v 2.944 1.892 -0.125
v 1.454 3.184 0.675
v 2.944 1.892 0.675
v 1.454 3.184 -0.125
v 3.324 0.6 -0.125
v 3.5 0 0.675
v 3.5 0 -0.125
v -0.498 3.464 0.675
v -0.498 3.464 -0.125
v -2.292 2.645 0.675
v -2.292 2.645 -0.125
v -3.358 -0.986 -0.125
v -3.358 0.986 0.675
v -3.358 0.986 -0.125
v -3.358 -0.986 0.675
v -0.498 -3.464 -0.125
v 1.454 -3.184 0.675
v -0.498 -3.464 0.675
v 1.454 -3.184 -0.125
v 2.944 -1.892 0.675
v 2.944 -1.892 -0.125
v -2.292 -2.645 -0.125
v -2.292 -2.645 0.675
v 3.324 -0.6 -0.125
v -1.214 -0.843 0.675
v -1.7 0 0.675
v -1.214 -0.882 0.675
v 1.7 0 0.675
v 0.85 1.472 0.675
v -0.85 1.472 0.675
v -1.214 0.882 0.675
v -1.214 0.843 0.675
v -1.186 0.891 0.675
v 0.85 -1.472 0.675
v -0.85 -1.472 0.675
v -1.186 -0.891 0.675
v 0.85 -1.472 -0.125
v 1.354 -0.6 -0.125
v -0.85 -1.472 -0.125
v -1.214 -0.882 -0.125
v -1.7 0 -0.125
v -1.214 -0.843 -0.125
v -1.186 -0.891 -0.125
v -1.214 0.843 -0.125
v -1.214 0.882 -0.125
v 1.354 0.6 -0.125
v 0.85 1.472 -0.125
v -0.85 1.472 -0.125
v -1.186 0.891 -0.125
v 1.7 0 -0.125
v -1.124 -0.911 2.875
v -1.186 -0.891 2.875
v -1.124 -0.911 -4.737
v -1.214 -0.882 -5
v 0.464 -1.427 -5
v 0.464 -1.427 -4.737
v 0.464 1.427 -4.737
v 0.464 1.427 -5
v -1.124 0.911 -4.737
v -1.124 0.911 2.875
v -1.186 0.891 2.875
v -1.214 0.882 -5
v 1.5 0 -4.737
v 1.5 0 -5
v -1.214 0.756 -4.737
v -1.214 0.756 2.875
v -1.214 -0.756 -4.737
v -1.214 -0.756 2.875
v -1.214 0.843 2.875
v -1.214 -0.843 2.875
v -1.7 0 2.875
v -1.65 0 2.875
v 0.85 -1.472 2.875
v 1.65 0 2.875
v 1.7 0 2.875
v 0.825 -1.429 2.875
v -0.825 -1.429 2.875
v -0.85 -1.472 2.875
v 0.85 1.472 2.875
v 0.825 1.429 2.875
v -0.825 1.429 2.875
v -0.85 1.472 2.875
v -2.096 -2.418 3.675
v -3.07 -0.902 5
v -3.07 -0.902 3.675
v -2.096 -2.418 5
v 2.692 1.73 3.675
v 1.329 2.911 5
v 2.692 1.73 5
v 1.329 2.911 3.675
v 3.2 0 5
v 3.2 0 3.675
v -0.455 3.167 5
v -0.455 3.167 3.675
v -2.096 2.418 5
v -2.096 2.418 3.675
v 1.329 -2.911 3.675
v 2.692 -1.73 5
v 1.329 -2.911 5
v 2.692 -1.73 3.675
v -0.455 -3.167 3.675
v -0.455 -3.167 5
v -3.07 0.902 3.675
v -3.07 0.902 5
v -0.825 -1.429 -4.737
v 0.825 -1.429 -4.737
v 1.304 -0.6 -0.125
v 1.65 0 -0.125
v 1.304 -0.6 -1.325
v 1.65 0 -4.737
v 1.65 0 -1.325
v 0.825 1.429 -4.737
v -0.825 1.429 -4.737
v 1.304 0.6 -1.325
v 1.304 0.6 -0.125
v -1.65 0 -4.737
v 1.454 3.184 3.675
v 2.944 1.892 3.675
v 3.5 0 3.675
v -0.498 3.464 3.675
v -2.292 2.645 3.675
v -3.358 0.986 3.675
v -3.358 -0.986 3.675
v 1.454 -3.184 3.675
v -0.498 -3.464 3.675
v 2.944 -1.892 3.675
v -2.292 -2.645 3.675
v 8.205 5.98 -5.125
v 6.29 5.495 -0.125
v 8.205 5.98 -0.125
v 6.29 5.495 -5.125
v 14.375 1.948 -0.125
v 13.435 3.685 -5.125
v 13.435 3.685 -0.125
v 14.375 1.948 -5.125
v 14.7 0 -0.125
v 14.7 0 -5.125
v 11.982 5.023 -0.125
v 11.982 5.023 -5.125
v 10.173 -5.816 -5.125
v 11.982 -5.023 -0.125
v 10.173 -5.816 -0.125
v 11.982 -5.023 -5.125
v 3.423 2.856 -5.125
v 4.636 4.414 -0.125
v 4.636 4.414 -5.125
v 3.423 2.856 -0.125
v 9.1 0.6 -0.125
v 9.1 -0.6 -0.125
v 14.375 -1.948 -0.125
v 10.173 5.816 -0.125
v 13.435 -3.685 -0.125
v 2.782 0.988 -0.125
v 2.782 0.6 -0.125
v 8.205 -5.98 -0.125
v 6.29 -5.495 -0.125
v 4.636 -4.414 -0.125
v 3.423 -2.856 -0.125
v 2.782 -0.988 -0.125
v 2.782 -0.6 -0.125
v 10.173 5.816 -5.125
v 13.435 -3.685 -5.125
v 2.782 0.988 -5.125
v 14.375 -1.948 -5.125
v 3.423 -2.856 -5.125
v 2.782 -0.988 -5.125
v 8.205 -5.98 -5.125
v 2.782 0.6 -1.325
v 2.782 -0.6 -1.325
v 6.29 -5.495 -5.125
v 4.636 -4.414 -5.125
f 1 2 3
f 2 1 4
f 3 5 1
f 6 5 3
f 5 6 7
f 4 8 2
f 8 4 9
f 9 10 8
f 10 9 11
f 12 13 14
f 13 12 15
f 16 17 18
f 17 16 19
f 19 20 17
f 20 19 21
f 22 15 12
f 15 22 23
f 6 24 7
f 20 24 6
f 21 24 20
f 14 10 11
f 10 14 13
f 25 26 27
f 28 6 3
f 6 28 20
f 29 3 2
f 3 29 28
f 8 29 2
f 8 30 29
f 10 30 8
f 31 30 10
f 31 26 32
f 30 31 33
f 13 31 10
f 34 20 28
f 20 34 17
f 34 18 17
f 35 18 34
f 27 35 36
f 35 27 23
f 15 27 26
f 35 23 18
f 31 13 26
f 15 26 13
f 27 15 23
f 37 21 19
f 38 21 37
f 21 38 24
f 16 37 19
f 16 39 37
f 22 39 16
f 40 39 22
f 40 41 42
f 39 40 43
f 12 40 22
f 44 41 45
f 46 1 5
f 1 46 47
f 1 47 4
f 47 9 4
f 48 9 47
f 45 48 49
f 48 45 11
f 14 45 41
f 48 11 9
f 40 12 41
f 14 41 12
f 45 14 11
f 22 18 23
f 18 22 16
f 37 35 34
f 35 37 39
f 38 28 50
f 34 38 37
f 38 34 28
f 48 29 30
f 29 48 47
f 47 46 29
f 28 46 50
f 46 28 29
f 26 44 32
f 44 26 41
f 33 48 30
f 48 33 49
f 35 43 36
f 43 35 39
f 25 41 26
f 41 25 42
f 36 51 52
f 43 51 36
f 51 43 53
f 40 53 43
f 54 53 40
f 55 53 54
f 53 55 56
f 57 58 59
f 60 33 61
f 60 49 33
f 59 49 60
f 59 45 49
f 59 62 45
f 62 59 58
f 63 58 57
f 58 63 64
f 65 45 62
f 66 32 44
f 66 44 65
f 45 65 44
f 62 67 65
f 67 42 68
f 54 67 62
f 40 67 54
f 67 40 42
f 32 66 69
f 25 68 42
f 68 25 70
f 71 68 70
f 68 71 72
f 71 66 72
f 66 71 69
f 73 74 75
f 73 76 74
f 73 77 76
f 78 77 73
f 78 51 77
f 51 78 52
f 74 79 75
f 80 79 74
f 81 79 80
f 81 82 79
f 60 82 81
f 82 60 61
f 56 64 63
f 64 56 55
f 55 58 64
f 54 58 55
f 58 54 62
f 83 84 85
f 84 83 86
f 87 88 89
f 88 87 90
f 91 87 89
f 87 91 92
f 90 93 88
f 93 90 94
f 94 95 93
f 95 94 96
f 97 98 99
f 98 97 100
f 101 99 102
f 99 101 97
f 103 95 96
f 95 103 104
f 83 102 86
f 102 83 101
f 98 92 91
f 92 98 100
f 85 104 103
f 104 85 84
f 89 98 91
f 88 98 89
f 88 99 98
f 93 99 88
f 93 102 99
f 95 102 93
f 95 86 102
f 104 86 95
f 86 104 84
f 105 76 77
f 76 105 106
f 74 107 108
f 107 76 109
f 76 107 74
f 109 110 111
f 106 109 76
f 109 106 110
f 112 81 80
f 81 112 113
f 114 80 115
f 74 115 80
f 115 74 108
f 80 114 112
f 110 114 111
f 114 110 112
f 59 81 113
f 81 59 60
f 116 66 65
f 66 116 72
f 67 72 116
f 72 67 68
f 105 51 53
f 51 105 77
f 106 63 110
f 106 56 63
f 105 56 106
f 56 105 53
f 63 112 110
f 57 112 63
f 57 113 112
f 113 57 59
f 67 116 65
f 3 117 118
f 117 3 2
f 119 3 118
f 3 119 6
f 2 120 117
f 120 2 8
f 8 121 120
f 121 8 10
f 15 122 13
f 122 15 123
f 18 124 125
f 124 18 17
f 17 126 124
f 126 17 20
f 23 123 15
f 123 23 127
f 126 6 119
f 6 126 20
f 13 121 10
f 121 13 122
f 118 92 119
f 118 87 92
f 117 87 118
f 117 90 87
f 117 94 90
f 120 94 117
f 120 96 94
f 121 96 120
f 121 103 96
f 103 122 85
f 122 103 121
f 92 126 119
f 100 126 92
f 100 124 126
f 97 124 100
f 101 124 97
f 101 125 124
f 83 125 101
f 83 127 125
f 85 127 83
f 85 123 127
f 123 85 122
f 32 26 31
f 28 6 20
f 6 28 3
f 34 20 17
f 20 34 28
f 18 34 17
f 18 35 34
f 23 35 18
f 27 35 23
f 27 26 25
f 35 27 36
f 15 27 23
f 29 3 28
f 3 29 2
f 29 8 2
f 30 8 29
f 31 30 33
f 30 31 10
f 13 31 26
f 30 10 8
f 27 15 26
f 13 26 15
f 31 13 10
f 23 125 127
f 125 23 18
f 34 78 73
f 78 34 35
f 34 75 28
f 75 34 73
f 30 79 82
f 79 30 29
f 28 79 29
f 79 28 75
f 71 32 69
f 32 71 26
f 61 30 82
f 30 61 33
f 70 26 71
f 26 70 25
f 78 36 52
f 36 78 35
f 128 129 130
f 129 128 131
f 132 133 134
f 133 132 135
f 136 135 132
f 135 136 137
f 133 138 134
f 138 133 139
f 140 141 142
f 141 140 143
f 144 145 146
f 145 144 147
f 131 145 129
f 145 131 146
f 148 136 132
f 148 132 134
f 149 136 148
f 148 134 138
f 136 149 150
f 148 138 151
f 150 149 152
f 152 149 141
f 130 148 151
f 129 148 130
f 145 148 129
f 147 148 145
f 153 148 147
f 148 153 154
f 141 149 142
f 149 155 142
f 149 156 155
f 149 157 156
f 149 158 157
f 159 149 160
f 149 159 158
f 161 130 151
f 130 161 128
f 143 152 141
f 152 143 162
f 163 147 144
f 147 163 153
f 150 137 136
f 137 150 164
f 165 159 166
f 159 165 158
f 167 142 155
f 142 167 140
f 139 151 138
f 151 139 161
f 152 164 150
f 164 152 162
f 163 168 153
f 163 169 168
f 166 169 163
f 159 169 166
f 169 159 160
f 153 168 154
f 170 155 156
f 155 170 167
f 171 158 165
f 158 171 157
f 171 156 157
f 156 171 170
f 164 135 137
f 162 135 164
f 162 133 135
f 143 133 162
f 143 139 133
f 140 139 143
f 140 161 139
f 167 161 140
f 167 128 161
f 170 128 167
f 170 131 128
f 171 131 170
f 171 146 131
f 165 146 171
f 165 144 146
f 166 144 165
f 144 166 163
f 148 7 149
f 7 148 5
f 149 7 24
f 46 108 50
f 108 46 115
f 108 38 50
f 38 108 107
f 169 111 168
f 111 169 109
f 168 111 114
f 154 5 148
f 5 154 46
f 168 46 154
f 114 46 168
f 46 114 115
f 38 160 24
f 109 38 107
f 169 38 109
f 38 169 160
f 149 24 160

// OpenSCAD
// Parameters
shaft_diameter_mm = 3; //[1.5:6:0.1]
length_mm = 10; //[5:20:0.5]
head_diameter_mm = 6.4; //[3.2:12.8:0.1]
head_height_mm = 2.125; //[1.0625:4.25:0.025]
threaded = 1; //[0:1:1]
thread_pitch_mm = 0.5; //[0.25:1:0.05]
thread_depth_mm = 0.15; //[0.05:0.35:0.01]
thread_length_mm = 8; //[3:18:0.5]
under_head_fillet_height_mm = 0.6; //[0.3:1.2:0.05]
overlap_mm = 0.8; //[0.2:2:0.1]
pcb_spacer_height_mm = 3; //[1.5:8:0.5]
pcb_spacer_wall_mm = 1.8; //[0.9:3.6:0.1]
clearance_mm = 0.2; //[0.1:0.6:0.05]
washer_outer_diameter_mm = 7; //[3.5:14:0.1]
washer_thickness_mm = 0.8; //[0.4:1.6:0.05]
buzzer_diameter_mm = 12; //[6:24:0.5]
buzzer_height_mm = 5; //[2.5:10:0.5]
buzzer_bridge_thickness_mm = 1.2; //[0.6:2.4:0.1]

// PCB Spacer - complete geometry
module pcb_spacer() {
  color([0.85, 0.85, 0.8]) {
    difference() {
      cylinder(r=shaft_diameter_mm/2 + clearance_mm + pcb_spacer_wall_mm, h=pcb_spacer_height_mm, center=true);
      translate([0, 0, -overlap_mm])
        cylinder(r=shaft_diameter_mm/2 + clearance_mm, h=pcb_spacer_height_mm + 2*overlap_mm, center=true);
    }
  }
}

// Screw and Washer - complete geometry
module screw_and_washer() {
  color("DimGray") {
    union() {
      // Screw Shaft
      translate([0, 0, -head_height_mm/2])
        cylinder(r=shaft_diameter_mm/2, h=length_mm - head_height_mm, center=true);
      
      // Hex Head
      translate([0, 0, length_mm/2 - head_height_mm/2])
        cylinder(r=head_diameter_mm/2, h=head_height_mm, center=true);
      
      // Under Head Transition
      translate([0, 0, length_mm/2 - head_height_mm - under_head_fillet_height_mm/2 + overlap_mm])
        cylinder(r1=head_diameter_mm/2, r2=shaft_diameter_mm/2, h=under_head_fillet_height_mm, center=true);
      
      // Thread Representation
      if (threaded) {
        translate([0, 0, -(length_mm - head_height_mm)/2 + thread_length_mm/2 - overlap_mm])
          cylinder(r=shaft_diameter_mm/2 + thread_depth_mm, h=thread_length_mm, center=true);
      }
      
      // Washer
      translate([0, 0, length_mm/2 - head_height_mm - pcb_spacer_height_mm - washer_thickness_mm/2 + overlap_mm])
        difference() {
          cylinder(r=washer_outer_diameter_mm/2, h=washer_thickness_mm, center=true);
          translate([0, 0, -overlap_mm])
            cylinder(r=shaft_diameter_mm/2 + clearance_mm, h=washer_thickness_mm + 2*overlap_mm, center=true);
        }
    }
  }
}

// Buzzer - complete geometry
module buzzer() {
  color([0.1, 0.1, 0.6]) {
    union() {
      // Buzzer Body
      translate([washer_outer_diameter_mm/2 + buzzer_diameter_mm/2 - overlap_mm, 0, length_mm/2 - head_height_mm - pcb_spacer_height_mm - washer_thickness_mm - buzzer_height_mm/2 + overlap_mm])
        cylinder(r=buzzer_diameter_mm/2, h=buzzer_height_mm, center=true);
      
      // Buzzer Bridge
      translate([(washer_outer_diameter_mm/2 + buzzer_diameter_mm/2 - overlap_mm)/2, 0, length_mm/2 - head_height_mm - pcb_spacer_height_mm - washer_thickness_mm - buzzer_bridge_thickness_mm/2 + overlap_mm])
        cube([washer_outer_diameter_mm/2 + buzzer_diameter_mm/2, buzzer_bridge_thickness_mm, buzzer_bridge_thickness_mm], center=true);
    }
  }
}

// Assembly
module assembly() {
  screw_and_washer();
  translate([0, 0, length_mm/2 - head_height_mm - pcb_spacer_height_mm/2 + overlap_mm])
    pcb_spacer();
  buzzer();
}

assembly();
